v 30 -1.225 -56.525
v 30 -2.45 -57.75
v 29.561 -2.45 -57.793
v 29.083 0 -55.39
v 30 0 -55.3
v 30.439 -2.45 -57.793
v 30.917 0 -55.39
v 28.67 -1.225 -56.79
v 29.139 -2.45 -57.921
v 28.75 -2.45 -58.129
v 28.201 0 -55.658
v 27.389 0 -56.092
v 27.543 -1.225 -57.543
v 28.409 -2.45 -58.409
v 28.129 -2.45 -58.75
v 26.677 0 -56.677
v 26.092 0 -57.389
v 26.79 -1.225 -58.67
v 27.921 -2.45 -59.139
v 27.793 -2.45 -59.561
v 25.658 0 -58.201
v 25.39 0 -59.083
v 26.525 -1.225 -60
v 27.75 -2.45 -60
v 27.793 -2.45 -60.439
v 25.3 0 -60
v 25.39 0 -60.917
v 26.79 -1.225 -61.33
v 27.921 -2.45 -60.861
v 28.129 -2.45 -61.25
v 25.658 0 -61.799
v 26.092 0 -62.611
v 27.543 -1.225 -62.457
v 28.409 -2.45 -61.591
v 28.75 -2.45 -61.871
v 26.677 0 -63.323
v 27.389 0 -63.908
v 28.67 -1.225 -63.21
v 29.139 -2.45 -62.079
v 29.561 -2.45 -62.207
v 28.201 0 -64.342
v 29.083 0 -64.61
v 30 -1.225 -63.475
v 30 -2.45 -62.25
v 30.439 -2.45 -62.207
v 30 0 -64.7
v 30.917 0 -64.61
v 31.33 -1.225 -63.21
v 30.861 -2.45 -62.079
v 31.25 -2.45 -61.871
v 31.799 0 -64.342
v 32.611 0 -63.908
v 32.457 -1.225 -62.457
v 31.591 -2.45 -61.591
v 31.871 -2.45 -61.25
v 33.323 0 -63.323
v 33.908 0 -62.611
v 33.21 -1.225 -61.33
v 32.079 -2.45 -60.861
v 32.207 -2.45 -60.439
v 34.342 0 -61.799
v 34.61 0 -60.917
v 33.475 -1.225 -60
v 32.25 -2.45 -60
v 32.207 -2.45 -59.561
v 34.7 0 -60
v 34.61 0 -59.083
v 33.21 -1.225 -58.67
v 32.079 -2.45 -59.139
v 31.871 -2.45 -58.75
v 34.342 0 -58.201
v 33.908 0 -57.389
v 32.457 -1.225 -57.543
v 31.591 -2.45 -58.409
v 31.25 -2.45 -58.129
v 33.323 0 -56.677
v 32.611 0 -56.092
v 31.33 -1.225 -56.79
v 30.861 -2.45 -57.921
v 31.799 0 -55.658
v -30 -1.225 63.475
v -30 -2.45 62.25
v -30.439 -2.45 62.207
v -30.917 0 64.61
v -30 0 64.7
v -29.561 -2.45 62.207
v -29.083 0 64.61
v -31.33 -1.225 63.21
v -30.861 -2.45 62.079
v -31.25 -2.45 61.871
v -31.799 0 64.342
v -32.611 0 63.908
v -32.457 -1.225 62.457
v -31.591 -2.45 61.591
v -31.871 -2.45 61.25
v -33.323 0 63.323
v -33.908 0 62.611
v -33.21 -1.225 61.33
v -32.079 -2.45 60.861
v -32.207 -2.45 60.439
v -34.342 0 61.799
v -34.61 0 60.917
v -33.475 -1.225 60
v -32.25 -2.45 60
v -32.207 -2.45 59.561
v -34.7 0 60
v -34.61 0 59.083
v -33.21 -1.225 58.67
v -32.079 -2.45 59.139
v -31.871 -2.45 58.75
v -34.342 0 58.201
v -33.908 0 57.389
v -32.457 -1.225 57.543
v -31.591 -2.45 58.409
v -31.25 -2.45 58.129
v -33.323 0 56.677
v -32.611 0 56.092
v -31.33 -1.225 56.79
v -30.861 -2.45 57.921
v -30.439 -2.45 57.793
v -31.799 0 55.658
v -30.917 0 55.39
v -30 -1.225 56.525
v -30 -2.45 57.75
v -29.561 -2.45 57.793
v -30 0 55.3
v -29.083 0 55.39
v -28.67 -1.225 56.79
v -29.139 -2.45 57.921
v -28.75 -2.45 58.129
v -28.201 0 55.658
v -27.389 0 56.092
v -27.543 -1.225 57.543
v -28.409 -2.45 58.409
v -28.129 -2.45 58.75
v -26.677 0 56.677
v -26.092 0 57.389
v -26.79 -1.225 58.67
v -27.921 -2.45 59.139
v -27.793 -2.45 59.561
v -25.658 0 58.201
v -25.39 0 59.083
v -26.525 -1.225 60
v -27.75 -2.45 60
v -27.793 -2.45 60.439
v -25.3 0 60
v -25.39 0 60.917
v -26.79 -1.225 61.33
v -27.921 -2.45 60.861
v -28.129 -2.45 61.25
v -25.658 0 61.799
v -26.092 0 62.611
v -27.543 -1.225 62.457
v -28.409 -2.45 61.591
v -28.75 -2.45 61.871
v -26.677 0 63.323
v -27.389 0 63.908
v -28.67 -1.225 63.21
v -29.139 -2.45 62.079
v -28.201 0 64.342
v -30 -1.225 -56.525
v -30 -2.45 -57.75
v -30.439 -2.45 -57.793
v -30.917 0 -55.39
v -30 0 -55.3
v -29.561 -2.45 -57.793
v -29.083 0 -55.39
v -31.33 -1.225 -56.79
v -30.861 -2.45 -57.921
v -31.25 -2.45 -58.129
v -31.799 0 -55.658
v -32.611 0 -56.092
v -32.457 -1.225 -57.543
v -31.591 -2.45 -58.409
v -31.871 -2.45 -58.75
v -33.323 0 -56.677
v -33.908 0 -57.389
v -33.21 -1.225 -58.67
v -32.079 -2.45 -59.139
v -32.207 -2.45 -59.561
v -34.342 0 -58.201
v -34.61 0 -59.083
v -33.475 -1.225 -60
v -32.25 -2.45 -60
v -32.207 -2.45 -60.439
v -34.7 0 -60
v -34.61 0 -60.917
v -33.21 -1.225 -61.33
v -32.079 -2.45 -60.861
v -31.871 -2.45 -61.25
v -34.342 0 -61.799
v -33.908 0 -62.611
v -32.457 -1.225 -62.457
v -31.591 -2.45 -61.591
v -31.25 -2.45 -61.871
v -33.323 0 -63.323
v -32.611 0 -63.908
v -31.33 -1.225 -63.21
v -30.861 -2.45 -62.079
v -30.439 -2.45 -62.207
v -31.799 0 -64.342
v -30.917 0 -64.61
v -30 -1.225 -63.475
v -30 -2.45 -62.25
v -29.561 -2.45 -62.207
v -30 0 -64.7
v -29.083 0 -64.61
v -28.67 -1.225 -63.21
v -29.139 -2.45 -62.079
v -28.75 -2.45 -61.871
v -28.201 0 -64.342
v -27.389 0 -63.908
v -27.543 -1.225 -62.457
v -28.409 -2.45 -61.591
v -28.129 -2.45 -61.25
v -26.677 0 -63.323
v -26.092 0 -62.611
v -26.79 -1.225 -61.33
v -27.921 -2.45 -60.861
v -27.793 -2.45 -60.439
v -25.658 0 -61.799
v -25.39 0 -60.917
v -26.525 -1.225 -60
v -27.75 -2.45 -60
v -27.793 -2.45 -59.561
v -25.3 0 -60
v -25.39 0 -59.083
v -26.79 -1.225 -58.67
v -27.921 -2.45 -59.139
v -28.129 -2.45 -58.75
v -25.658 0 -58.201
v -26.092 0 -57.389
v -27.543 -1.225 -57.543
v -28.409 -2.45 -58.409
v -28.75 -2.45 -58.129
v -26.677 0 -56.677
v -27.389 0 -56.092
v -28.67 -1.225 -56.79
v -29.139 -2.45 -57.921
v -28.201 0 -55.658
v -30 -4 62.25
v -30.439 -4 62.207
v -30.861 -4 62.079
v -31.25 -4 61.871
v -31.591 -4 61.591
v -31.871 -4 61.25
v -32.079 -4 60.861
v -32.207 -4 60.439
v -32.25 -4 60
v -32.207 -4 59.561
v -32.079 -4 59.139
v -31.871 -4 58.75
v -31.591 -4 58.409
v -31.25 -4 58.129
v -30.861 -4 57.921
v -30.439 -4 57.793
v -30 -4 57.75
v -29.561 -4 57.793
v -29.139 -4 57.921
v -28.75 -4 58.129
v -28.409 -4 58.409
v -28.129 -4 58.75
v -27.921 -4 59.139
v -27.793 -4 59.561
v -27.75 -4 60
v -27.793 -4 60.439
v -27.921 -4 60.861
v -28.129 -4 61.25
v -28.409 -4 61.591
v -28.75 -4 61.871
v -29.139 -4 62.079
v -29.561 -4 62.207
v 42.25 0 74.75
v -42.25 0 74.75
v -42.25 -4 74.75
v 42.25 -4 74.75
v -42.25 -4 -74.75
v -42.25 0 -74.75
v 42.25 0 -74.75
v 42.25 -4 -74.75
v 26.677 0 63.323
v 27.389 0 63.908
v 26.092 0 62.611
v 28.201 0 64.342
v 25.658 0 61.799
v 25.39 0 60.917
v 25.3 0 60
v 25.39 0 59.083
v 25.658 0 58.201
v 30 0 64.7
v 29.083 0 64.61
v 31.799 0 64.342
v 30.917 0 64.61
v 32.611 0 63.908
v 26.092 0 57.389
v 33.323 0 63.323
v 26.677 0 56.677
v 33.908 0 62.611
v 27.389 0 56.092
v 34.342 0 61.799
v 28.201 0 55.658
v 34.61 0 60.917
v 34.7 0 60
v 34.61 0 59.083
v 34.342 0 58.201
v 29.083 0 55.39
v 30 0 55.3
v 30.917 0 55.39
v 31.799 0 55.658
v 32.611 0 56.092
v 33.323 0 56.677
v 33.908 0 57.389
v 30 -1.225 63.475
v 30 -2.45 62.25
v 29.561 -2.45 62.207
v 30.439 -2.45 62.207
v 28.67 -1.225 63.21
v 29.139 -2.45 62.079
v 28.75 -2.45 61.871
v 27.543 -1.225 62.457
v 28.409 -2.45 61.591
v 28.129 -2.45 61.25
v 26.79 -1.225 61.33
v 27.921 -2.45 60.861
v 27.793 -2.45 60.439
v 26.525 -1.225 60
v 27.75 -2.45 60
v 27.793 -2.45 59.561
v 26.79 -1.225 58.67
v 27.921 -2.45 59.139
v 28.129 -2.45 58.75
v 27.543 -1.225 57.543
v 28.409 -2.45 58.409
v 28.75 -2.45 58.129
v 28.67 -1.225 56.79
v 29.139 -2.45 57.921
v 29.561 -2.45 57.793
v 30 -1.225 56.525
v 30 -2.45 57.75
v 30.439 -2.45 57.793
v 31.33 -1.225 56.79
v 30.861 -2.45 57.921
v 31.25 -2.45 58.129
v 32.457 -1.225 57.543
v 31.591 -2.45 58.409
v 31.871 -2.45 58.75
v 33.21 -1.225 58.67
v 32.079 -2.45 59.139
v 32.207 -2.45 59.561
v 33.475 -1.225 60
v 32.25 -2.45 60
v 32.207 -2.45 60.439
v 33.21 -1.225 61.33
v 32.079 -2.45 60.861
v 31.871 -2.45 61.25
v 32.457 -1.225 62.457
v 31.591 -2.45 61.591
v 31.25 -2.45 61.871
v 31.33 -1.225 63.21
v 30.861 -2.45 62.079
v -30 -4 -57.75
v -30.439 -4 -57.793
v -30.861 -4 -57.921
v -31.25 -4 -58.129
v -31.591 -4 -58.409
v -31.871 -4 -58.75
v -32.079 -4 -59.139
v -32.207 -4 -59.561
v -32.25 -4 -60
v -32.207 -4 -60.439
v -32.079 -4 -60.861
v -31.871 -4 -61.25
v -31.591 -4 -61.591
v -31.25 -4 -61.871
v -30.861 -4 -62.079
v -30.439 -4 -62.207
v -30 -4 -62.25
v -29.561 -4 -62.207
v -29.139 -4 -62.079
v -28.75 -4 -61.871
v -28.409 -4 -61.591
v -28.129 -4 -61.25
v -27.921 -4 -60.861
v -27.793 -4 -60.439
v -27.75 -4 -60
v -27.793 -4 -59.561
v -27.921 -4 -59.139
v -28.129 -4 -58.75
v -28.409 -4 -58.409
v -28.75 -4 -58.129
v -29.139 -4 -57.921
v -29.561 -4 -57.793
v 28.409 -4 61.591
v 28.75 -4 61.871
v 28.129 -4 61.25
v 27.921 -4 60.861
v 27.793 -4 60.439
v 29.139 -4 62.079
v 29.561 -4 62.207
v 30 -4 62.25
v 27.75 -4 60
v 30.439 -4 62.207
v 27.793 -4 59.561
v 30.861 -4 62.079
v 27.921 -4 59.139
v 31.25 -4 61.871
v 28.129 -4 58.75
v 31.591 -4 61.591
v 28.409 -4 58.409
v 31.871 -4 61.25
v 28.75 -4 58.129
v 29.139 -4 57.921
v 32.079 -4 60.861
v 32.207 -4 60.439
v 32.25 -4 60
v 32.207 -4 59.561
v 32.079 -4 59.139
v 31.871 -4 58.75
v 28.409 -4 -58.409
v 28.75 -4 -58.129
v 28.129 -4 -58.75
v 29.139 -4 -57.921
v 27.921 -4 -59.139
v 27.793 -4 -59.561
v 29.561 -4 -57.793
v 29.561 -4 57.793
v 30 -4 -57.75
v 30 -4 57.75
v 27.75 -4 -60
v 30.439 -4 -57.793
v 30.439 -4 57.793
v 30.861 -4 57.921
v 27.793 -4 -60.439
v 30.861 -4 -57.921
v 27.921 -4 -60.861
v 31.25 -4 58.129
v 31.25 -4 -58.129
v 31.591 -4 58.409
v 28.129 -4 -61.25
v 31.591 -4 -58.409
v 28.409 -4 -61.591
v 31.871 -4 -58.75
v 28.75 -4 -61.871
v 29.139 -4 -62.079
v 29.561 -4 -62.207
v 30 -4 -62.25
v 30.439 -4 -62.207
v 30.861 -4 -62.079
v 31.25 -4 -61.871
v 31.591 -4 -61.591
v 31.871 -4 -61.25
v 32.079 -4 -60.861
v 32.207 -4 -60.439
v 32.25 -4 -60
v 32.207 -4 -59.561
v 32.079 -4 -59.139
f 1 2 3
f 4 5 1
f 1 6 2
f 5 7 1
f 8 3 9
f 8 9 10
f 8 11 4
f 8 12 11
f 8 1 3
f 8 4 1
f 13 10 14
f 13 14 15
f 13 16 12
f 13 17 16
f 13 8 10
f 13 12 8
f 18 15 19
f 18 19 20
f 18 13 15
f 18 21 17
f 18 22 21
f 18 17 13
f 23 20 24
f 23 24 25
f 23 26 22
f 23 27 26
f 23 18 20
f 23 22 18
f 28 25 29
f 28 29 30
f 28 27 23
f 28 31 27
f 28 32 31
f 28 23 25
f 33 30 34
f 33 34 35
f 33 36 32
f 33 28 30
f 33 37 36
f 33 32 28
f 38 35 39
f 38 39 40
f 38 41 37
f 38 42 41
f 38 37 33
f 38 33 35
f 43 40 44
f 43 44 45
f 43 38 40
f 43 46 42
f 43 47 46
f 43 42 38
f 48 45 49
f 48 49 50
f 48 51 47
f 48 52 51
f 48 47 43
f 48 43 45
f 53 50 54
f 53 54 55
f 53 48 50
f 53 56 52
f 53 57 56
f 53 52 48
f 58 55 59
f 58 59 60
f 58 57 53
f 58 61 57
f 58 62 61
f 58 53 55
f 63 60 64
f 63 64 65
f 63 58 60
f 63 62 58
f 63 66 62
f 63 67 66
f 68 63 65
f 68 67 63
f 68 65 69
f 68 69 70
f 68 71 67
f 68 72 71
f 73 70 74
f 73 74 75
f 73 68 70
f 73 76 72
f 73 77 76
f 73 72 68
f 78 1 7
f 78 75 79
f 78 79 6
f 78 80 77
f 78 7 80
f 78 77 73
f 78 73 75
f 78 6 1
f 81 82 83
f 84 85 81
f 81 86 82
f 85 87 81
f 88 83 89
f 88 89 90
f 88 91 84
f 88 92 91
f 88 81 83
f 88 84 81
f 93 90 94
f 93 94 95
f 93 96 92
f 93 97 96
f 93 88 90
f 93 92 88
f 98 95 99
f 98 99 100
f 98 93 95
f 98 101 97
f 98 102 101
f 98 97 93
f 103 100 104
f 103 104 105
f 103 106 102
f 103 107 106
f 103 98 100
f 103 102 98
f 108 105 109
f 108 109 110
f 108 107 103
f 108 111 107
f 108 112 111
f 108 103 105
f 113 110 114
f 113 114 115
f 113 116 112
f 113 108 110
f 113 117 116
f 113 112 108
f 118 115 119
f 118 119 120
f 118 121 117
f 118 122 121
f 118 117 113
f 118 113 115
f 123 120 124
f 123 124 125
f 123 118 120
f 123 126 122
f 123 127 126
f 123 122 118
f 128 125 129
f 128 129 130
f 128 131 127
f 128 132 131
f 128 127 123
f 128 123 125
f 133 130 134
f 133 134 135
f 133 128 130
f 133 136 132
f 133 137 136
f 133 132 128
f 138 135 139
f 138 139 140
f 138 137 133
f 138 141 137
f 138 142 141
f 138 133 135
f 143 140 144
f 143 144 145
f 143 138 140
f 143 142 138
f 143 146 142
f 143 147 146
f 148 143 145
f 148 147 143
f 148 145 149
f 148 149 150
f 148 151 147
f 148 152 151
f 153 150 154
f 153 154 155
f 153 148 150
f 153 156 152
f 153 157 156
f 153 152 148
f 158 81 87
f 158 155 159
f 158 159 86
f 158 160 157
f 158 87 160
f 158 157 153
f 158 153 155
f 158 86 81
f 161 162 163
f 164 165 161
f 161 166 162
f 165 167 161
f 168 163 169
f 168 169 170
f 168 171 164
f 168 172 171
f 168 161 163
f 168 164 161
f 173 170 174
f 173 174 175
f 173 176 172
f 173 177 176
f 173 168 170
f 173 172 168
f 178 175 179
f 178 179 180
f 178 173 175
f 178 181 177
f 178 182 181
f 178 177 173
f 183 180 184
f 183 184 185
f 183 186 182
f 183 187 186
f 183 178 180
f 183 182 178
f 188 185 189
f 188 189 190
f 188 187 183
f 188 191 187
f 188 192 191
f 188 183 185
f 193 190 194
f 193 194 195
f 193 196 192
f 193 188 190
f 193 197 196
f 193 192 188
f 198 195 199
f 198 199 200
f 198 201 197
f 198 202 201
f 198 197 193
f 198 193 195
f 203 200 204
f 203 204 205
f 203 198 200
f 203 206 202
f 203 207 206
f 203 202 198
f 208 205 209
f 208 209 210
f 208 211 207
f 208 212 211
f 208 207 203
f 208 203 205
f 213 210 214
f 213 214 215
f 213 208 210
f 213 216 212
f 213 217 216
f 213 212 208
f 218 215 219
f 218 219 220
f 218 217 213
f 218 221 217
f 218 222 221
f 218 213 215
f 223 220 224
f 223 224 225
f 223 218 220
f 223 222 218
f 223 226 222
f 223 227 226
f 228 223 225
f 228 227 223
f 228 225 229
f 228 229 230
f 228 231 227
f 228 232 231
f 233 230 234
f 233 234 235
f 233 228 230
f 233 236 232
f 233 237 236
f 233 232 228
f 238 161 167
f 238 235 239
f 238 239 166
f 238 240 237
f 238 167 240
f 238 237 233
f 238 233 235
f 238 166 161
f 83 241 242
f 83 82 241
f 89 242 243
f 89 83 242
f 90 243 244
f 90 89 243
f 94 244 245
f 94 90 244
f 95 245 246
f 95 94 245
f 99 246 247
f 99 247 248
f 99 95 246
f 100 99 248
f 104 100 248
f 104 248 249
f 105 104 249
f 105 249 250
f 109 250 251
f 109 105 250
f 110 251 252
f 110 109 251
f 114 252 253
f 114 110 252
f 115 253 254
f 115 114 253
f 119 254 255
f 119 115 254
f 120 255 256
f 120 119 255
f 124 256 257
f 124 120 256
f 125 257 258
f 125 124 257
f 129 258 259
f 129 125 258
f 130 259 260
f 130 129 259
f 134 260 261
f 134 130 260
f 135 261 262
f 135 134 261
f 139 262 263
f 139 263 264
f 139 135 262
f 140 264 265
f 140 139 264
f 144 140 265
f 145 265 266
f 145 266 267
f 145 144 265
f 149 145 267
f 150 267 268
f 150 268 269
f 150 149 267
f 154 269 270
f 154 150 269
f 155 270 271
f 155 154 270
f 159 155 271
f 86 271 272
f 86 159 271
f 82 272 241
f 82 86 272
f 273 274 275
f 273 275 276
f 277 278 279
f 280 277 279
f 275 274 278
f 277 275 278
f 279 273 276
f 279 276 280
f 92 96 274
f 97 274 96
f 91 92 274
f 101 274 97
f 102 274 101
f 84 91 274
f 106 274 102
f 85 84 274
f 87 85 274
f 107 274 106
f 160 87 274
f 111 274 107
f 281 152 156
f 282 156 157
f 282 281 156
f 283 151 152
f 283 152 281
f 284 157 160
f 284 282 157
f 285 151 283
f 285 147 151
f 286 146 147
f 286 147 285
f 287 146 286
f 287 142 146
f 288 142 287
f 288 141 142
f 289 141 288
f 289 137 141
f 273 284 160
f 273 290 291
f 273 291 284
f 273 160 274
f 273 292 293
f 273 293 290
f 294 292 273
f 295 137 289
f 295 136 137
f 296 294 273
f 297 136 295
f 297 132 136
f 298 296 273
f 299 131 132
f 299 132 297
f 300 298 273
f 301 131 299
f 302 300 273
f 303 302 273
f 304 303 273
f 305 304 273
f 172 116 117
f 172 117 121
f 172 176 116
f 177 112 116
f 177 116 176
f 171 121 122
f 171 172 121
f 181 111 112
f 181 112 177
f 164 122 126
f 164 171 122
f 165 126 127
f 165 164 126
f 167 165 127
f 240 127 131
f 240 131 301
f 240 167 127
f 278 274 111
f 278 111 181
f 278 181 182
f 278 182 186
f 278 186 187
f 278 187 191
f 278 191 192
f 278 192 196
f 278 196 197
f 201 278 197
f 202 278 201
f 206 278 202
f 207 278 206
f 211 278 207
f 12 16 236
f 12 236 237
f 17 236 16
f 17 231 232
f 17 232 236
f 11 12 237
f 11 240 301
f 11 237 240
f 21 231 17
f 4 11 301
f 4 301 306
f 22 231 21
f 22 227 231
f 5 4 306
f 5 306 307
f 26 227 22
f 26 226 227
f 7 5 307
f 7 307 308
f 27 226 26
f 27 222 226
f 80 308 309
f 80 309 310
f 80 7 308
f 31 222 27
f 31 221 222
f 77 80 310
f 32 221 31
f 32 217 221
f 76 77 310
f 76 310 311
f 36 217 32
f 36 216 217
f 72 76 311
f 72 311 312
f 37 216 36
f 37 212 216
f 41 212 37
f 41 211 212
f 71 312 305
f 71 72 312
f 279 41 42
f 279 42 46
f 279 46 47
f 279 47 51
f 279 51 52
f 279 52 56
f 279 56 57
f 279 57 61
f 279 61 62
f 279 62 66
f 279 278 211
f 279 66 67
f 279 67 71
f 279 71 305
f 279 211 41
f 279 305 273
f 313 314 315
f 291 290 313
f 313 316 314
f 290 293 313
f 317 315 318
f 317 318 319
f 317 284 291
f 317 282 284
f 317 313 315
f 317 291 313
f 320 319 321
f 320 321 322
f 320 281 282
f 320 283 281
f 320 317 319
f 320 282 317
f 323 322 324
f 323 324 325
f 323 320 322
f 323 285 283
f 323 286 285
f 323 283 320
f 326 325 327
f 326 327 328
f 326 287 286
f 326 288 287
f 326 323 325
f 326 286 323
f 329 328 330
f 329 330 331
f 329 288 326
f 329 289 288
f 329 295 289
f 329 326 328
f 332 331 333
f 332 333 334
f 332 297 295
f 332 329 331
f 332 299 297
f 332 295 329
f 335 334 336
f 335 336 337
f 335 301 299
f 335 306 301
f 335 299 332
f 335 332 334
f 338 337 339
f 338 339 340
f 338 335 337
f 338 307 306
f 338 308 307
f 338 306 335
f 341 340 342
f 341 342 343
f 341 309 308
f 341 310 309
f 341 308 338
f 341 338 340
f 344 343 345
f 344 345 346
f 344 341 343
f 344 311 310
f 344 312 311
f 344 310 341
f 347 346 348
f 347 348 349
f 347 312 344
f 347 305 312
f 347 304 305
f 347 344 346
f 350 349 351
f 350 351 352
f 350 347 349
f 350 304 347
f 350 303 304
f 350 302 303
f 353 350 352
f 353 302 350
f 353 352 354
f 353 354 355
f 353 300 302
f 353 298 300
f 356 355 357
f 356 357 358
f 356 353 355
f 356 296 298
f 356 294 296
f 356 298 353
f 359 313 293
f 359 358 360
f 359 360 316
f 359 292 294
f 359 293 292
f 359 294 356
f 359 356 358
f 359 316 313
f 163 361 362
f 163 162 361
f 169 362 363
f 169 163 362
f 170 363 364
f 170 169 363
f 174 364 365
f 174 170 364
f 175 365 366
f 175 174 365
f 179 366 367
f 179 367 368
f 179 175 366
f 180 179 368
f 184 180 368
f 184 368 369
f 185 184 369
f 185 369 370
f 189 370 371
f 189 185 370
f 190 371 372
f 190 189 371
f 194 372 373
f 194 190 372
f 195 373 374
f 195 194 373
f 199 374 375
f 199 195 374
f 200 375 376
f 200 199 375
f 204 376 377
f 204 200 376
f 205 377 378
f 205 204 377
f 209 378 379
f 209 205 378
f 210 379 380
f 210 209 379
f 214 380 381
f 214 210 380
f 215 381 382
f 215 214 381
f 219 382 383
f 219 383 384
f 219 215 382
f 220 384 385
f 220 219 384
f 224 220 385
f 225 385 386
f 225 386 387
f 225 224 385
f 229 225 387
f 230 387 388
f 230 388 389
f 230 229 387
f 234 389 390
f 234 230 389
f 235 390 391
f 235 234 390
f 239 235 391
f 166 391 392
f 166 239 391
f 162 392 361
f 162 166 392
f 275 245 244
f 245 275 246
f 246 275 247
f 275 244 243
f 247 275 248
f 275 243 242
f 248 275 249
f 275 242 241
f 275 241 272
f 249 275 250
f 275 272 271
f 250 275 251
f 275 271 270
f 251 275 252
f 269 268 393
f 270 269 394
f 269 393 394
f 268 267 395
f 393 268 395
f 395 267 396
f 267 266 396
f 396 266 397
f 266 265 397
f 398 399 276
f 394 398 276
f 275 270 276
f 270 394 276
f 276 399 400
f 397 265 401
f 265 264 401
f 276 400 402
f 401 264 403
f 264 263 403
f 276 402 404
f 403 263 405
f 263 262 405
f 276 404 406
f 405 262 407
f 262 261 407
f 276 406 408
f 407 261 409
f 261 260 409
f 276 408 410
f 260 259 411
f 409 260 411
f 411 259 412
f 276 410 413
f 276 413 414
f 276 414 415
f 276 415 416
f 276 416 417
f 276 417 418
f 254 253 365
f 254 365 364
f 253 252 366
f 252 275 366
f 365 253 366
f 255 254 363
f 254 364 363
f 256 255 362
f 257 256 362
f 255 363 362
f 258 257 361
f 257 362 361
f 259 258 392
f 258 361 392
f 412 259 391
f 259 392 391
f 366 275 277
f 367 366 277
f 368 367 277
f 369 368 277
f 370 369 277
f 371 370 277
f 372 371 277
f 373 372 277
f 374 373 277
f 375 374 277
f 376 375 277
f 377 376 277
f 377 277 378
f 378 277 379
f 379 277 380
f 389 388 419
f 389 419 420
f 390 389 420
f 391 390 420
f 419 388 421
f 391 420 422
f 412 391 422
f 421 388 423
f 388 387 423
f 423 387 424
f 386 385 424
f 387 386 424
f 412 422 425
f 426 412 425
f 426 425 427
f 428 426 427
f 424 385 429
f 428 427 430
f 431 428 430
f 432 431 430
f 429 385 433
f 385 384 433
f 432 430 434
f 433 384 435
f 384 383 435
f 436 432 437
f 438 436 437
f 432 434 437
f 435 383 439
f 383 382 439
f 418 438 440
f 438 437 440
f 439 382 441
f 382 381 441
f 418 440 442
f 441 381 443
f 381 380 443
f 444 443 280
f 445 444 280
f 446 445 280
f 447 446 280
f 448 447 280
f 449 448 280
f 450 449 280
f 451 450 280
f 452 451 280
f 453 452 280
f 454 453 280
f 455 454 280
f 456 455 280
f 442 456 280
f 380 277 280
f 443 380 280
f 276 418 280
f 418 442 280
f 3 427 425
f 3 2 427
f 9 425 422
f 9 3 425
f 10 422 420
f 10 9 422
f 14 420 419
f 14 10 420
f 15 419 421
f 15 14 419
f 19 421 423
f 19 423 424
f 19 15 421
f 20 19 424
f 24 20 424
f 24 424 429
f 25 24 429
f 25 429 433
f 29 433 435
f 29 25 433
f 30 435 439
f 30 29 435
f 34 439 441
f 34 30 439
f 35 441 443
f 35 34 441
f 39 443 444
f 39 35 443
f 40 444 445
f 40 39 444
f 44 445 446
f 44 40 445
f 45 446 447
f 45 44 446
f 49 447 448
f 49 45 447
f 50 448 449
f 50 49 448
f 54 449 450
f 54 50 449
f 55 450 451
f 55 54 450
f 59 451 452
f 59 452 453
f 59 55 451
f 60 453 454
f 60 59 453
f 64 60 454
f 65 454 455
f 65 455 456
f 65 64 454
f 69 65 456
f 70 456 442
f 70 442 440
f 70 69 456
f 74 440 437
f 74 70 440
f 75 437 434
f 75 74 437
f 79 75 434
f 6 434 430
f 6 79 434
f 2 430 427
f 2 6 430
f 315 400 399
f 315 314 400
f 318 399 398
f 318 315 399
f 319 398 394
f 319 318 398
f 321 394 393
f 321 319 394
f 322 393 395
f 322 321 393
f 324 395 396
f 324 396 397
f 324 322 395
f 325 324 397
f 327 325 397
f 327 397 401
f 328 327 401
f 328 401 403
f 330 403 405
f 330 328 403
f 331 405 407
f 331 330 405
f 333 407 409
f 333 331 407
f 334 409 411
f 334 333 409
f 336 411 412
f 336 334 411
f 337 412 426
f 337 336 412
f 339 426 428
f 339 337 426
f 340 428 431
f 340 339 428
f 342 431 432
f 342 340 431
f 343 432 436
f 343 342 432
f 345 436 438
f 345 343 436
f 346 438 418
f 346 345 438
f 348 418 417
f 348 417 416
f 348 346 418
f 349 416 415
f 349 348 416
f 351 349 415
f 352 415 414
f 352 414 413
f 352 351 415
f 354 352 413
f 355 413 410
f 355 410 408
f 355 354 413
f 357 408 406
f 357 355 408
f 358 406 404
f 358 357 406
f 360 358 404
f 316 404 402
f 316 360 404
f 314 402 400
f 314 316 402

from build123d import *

# Parameters (mm, degrees)
SKETCH1_W                                      = 84.5
SKETCH1_H                                      = 149.5
BASE_FLANGE1_DEPTH                             = 4
CSK_FOR_M4_FLAT_HEAD_MACHINE_SCREW1_AT_2_COUNT = 2
CSK_FOR_M4_FLAT_HEAD_MACHINE_SCREW1_AT_2_PITCH = 60
CSK_FOR_M4_FLAT_HEAD_MACHINE_SCREW1_AT_3_COUNT = 2
CSK_FOR_M4_FLAT_HEAD_MACHINE_SCREW1_AT_3_PITCH = 134.16407865
CSK_FOR_M4_FLAT_HEAD_MACHINE_SCREW1_AT_4_COUNT = 2
CSK_FOR_M4_FLAT_HEAD_MACHINE_SCREW1_AT_4_PITCH = 120


# Sheet-metal steps are written as plain solids
with BuildPart() as part:
    # Sketch1 → Base-Flange1 (new body)
    with BuildSketch(Plane(origin=(0, 0, 0), x_dir=(1, 0, 0), z_dir=(0, 1, 0))):
        Rectangle(SKETCH1_W, SKETCH1_H)
    extrude(amount=-BASE_FLANGE1_DEPTH)

    # Sketch5 → CSK for M4 Flat Head Machine Screw1 (revolve, cut)
    with BuildSketch(Plane(origin=(30, 0, -60), x_dir=(0, 0, 1), z_dir=(1, 0, 0))):
        Polygon((0, 0), (0, 4), (2.25, 4), (2.25, 2.45), (4.7, 0), align=None)
    csk_for_m4_flat_head_machine_screw1 = revolve(axis=Axis((30, 6.35, -60), (0, -1, 0)), mode=Mode.SUBTRACT)

    # CSK for M4 Flat Head Machine Screw1 at 2: CSK for M4 Flat Head Machine Screw1 ×2
    with Locations(*[(-i * CSK_FOR_M4_FLAT_HEAD_MACHINE_SCREW1_AT_2_PITCH, 0, 0) for i in range(1, CSK_FOR_M4_FLAT_HEAD_MACHINE_SCREW1_AT_2_COUNT)]):
        add(csk_for_m4_flat_head_machine_screw1, mode=Mode.SUBTRACT)

    # CSK for M4 Flat Head Machine Screw1 at 3: CSK for M4 Flat Head Machine Screw1 ×2
    with Locations(*[Vector(-0.44721359549995787, 0, 0.894427190999916) * (i * CSK_FOR_M4_FLAT_HEAD_MACHINE_SCREW1_AT_3_PITCH) for i in range(1, CSK_FOR_M4_FLAT_HEAD_MACHINE_SCREW1_AT_3_COUNT)]):
        add(csk_for_m4_flat_head_machine_screw1, mode=Mode.SUBTRACT)

    # CSK for M4 Flat Head Machine Screw1 at 4: CSK for M4 Flat Head Machine Screw1 ×2
    with Locations(*[(0, 0, i * CSK_FOR_M4_FLAT_HEAD_MACHINE_SCREW1_AT_4_PITCH) for i in range(1, CSK_FOR_M4_FLAT_HEAD_MACHINE_SCREW1_AT_4_COUNT)]):
        add(csk_for_m4_flat_head_machine_screw1, mode=Mode.SUBTRACT)


solid = part.part
